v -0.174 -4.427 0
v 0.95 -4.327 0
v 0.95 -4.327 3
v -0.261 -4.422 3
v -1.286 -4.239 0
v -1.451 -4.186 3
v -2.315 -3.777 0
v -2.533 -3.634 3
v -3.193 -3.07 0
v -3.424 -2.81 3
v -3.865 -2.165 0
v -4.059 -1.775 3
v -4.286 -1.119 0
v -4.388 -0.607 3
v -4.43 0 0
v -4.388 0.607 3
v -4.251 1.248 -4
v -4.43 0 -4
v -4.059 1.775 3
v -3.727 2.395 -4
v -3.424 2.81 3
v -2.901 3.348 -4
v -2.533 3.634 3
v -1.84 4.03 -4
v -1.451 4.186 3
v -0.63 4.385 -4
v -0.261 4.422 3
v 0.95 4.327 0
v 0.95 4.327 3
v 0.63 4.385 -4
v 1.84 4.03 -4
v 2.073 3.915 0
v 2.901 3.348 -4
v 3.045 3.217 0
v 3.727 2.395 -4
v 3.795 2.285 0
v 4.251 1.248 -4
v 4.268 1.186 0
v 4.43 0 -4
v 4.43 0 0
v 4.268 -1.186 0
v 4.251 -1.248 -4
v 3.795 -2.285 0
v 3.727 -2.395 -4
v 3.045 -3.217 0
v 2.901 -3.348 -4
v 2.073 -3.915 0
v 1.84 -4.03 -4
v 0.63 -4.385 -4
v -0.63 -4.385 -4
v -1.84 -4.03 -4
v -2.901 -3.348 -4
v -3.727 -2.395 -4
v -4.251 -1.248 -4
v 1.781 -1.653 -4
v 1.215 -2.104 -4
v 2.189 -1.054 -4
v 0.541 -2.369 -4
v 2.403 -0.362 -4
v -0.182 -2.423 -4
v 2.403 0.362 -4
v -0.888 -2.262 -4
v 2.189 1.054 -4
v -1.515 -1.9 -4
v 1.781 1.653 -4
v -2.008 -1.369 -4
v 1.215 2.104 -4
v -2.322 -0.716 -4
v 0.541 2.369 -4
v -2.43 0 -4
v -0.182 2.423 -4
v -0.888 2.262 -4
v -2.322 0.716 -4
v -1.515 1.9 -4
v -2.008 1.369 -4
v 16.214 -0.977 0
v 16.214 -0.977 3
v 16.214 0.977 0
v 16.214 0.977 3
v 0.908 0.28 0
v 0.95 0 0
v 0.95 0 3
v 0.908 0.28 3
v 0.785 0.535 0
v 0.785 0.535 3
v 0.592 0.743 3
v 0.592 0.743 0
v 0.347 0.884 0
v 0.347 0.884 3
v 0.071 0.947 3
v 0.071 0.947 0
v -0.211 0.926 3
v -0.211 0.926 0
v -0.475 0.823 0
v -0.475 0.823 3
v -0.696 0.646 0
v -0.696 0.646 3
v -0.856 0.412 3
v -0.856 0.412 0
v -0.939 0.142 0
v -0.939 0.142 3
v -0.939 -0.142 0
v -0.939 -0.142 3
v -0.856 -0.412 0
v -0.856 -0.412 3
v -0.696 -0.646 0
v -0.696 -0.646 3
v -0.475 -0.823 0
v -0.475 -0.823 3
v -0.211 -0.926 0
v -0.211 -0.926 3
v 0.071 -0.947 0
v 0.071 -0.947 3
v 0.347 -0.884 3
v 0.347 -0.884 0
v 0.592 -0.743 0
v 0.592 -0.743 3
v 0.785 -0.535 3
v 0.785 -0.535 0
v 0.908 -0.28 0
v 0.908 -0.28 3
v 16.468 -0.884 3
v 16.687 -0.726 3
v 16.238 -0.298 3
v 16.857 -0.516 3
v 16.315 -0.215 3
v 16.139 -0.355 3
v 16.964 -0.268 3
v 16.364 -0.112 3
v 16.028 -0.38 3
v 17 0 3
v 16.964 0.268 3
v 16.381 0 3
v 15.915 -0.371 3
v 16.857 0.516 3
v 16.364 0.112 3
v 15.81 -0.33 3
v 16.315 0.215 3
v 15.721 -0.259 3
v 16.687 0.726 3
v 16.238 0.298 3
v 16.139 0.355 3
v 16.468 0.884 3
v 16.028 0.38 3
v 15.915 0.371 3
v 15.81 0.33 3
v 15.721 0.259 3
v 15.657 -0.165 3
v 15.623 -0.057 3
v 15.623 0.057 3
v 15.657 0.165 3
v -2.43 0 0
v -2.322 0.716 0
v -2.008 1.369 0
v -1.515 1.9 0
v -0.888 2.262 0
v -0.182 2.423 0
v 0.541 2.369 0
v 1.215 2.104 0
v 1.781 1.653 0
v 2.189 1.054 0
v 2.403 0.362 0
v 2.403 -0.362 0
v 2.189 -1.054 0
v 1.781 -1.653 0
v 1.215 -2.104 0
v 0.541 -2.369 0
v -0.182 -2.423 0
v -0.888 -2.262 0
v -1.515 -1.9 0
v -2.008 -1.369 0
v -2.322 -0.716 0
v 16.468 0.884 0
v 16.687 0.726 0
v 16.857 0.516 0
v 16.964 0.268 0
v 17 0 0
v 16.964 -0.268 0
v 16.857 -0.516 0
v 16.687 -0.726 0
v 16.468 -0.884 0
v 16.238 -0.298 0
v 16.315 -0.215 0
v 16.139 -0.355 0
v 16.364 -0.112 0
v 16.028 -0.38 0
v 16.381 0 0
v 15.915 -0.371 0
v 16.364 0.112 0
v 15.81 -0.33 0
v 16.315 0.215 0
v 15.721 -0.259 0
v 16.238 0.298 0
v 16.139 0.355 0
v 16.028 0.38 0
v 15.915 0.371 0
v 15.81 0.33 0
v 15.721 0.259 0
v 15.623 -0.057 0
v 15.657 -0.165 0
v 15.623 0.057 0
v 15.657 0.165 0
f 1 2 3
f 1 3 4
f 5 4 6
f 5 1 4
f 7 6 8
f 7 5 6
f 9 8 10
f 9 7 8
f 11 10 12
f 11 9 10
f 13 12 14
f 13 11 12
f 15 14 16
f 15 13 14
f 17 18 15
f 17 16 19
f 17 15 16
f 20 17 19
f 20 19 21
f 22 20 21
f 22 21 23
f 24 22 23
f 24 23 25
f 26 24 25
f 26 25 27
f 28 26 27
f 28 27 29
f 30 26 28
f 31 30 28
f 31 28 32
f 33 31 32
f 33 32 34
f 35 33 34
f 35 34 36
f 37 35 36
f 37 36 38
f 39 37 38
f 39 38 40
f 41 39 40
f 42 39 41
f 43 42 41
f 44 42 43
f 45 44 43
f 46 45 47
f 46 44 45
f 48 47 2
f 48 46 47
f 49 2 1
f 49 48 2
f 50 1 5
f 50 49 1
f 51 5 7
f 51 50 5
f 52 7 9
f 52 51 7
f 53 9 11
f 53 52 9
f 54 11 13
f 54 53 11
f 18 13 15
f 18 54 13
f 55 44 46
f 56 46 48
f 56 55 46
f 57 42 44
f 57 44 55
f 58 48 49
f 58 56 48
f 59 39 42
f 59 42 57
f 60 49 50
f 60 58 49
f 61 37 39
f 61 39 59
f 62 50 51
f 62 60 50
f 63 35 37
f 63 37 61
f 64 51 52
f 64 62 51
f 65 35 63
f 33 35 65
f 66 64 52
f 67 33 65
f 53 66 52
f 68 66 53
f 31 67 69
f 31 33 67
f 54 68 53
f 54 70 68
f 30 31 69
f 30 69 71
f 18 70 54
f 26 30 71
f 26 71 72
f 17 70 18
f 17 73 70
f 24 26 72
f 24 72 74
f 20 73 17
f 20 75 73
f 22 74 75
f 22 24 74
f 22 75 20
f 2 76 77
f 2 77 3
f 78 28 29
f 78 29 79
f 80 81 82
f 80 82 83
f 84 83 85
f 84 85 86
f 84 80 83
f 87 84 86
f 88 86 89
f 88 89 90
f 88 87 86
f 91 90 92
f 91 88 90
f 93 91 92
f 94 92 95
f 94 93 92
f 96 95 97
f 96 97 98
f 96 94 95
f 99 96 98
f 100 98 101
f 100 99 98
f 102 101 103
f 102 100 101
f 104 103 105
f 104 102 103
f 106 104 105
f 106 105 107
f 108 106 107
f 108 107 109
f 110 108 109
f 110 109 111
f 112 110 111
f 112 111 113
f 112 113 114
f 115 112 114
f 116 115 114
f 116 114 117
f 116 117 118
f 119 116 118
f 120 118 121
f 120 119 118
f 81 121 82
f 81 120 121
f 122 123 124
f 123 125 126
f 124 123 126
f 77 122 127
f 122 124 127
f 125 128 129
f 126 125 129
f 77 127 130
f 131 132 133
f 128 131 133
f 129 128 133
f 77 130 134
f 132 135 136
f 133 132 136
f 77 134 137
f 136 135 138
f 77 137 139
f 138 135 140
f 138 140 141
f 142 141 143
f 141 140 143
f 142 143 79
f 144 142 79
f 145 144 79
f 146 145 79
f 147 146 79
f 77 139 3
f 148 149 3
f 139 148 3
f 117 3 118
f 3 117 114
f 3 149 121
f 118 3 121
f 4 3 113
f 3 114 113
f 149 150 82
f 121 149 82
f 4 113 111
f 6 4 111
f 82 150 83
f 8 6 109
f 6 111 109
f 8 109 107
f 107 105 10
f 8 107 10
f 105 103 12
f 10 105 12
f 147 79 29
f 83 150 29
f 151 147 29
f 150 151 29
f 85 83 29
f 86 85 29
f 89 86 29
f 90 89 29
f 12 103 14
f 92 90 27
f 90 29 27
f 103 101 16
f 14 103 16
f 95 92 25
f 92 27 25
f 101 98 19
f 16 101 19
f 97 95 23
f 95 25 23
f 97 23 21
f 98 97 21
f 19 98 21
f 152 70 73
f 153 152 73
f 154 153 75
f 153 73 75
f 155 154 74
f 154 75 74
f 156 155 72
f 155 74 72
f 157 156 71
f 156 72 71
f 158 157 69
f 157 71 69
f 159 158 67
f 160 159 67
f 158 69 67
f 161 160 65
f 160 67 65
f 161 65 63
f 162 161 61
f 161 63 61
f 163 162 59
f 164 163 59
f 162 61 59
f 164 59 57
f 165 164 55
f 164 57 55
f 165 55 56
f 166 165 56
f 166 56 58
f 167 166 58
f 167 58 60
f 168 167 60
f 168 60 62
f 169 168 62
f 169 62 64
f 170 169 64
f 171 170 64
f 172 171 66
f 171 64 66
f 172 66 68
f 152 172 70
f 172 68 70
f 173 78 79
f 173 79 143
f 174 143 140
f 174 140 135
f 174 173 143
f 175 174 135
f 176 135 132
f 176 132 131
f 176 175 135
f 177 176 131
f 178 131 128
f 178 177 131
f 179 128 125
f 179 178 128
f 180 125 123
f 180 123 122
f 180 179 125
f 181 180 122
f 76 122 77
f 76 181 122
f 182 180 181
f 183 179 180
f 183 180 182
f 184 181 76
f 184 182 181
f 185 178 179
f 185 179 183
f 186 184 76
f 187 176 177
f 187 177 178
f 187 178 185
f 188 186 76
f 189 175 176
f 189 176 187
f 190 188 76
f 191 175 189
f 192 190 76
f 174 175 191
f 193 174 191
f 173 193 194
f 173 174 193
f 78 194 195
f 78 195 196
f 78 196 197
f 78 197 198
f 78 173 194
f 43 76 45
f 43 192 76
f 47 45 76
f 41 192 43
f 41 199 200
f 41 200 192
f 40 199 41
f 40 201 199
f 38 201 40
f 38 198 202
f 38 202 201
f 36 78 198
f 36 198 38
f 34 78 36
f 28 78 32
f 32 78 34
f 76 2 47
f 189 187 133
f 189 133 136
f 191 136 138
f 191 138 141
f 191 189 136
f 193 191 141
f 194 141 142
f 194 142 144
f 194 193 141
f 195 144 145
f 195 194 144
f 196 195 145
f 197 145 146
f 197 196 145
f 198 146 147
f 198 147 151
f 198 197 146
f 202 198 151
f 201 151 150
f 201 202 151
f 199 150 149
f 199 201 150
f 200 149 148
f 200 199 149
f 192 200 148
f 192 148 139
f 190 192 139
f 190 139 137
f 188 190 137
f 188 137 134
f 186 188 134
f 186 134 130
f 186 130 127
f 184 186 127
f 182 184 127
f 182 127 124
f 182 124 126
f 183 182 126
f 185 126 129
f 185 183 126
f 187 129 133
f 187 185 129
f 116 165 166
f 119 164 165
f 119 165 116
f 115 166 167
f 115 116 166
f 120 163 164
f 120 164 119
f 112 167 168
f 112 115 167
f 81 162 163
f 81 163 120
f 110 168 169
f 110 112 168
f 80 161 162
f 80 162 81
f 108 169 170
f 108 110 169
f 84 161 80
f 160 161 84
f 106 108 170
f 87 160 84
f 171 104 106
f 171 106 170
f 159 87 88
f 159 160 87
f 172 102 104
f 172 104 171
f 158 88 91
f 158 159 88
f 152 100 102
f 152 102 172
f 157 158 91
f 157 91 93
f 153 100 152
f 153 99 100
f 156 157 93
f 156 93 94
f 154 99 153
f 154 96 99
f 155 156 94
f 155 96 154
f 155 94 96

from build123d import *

# Parameters (mm, degrees)
SKETCH1_R           = 0.95
SKETCH1_R_2         = 0.381
BOSS_EXTRUDE1_DEPTH = 3
BOSS_EXTRUDE2_START = 4
SKETCH2_R           = 4.43
SKETCH2_R_2         = 2.43
BOSS_EXTRUDE2_DEPTH = 4


with BuildPart() as part:
    # Sketch1 → Boss-Extrude1 (new body)
    with BuildSketch(Plane.XY):
        with BuildLine():
            Line((0.94968125, 4.327008843), (16.214375, 0.976751432))
            ThreePointArc((16.214375, 0.976751432), (17, 0), (16.214375, -0.976751432))
            Line((16.214375, -0.976751432), (0.94968125, -4.327008843))
            ThreePointArc((0.94968125, -4.327008843), (-4.43, 0), (0.94968125, 4.327008843))
        make_face()
        Circle(SKETCH1_R, mode=Mode.SUBTRACT)
        with Locations((16, 0)):
            Circle(SKETCH1_R_2, mode=Mode.SUBTRACT)
    extrude(amount=BOSS_EXTRUDE1_DEPTH)

    # Sketch2 → Boss-Extrude2 (add)
    with BuildSketch(Plane(origin=(0, 0, 0), x_dir=(-1, 0, 0), z_dir=(0, 0, -1)).offset(BOSS_EXTRUDE2_START)):
        Circle(SKETCH2_R)
        Circle(SKETCH2_R_2, mode=Mode.SUBTRACT)
    extrude(amount=-BOSS_EXTRUDE2_DEPTH)


solid = part.part
